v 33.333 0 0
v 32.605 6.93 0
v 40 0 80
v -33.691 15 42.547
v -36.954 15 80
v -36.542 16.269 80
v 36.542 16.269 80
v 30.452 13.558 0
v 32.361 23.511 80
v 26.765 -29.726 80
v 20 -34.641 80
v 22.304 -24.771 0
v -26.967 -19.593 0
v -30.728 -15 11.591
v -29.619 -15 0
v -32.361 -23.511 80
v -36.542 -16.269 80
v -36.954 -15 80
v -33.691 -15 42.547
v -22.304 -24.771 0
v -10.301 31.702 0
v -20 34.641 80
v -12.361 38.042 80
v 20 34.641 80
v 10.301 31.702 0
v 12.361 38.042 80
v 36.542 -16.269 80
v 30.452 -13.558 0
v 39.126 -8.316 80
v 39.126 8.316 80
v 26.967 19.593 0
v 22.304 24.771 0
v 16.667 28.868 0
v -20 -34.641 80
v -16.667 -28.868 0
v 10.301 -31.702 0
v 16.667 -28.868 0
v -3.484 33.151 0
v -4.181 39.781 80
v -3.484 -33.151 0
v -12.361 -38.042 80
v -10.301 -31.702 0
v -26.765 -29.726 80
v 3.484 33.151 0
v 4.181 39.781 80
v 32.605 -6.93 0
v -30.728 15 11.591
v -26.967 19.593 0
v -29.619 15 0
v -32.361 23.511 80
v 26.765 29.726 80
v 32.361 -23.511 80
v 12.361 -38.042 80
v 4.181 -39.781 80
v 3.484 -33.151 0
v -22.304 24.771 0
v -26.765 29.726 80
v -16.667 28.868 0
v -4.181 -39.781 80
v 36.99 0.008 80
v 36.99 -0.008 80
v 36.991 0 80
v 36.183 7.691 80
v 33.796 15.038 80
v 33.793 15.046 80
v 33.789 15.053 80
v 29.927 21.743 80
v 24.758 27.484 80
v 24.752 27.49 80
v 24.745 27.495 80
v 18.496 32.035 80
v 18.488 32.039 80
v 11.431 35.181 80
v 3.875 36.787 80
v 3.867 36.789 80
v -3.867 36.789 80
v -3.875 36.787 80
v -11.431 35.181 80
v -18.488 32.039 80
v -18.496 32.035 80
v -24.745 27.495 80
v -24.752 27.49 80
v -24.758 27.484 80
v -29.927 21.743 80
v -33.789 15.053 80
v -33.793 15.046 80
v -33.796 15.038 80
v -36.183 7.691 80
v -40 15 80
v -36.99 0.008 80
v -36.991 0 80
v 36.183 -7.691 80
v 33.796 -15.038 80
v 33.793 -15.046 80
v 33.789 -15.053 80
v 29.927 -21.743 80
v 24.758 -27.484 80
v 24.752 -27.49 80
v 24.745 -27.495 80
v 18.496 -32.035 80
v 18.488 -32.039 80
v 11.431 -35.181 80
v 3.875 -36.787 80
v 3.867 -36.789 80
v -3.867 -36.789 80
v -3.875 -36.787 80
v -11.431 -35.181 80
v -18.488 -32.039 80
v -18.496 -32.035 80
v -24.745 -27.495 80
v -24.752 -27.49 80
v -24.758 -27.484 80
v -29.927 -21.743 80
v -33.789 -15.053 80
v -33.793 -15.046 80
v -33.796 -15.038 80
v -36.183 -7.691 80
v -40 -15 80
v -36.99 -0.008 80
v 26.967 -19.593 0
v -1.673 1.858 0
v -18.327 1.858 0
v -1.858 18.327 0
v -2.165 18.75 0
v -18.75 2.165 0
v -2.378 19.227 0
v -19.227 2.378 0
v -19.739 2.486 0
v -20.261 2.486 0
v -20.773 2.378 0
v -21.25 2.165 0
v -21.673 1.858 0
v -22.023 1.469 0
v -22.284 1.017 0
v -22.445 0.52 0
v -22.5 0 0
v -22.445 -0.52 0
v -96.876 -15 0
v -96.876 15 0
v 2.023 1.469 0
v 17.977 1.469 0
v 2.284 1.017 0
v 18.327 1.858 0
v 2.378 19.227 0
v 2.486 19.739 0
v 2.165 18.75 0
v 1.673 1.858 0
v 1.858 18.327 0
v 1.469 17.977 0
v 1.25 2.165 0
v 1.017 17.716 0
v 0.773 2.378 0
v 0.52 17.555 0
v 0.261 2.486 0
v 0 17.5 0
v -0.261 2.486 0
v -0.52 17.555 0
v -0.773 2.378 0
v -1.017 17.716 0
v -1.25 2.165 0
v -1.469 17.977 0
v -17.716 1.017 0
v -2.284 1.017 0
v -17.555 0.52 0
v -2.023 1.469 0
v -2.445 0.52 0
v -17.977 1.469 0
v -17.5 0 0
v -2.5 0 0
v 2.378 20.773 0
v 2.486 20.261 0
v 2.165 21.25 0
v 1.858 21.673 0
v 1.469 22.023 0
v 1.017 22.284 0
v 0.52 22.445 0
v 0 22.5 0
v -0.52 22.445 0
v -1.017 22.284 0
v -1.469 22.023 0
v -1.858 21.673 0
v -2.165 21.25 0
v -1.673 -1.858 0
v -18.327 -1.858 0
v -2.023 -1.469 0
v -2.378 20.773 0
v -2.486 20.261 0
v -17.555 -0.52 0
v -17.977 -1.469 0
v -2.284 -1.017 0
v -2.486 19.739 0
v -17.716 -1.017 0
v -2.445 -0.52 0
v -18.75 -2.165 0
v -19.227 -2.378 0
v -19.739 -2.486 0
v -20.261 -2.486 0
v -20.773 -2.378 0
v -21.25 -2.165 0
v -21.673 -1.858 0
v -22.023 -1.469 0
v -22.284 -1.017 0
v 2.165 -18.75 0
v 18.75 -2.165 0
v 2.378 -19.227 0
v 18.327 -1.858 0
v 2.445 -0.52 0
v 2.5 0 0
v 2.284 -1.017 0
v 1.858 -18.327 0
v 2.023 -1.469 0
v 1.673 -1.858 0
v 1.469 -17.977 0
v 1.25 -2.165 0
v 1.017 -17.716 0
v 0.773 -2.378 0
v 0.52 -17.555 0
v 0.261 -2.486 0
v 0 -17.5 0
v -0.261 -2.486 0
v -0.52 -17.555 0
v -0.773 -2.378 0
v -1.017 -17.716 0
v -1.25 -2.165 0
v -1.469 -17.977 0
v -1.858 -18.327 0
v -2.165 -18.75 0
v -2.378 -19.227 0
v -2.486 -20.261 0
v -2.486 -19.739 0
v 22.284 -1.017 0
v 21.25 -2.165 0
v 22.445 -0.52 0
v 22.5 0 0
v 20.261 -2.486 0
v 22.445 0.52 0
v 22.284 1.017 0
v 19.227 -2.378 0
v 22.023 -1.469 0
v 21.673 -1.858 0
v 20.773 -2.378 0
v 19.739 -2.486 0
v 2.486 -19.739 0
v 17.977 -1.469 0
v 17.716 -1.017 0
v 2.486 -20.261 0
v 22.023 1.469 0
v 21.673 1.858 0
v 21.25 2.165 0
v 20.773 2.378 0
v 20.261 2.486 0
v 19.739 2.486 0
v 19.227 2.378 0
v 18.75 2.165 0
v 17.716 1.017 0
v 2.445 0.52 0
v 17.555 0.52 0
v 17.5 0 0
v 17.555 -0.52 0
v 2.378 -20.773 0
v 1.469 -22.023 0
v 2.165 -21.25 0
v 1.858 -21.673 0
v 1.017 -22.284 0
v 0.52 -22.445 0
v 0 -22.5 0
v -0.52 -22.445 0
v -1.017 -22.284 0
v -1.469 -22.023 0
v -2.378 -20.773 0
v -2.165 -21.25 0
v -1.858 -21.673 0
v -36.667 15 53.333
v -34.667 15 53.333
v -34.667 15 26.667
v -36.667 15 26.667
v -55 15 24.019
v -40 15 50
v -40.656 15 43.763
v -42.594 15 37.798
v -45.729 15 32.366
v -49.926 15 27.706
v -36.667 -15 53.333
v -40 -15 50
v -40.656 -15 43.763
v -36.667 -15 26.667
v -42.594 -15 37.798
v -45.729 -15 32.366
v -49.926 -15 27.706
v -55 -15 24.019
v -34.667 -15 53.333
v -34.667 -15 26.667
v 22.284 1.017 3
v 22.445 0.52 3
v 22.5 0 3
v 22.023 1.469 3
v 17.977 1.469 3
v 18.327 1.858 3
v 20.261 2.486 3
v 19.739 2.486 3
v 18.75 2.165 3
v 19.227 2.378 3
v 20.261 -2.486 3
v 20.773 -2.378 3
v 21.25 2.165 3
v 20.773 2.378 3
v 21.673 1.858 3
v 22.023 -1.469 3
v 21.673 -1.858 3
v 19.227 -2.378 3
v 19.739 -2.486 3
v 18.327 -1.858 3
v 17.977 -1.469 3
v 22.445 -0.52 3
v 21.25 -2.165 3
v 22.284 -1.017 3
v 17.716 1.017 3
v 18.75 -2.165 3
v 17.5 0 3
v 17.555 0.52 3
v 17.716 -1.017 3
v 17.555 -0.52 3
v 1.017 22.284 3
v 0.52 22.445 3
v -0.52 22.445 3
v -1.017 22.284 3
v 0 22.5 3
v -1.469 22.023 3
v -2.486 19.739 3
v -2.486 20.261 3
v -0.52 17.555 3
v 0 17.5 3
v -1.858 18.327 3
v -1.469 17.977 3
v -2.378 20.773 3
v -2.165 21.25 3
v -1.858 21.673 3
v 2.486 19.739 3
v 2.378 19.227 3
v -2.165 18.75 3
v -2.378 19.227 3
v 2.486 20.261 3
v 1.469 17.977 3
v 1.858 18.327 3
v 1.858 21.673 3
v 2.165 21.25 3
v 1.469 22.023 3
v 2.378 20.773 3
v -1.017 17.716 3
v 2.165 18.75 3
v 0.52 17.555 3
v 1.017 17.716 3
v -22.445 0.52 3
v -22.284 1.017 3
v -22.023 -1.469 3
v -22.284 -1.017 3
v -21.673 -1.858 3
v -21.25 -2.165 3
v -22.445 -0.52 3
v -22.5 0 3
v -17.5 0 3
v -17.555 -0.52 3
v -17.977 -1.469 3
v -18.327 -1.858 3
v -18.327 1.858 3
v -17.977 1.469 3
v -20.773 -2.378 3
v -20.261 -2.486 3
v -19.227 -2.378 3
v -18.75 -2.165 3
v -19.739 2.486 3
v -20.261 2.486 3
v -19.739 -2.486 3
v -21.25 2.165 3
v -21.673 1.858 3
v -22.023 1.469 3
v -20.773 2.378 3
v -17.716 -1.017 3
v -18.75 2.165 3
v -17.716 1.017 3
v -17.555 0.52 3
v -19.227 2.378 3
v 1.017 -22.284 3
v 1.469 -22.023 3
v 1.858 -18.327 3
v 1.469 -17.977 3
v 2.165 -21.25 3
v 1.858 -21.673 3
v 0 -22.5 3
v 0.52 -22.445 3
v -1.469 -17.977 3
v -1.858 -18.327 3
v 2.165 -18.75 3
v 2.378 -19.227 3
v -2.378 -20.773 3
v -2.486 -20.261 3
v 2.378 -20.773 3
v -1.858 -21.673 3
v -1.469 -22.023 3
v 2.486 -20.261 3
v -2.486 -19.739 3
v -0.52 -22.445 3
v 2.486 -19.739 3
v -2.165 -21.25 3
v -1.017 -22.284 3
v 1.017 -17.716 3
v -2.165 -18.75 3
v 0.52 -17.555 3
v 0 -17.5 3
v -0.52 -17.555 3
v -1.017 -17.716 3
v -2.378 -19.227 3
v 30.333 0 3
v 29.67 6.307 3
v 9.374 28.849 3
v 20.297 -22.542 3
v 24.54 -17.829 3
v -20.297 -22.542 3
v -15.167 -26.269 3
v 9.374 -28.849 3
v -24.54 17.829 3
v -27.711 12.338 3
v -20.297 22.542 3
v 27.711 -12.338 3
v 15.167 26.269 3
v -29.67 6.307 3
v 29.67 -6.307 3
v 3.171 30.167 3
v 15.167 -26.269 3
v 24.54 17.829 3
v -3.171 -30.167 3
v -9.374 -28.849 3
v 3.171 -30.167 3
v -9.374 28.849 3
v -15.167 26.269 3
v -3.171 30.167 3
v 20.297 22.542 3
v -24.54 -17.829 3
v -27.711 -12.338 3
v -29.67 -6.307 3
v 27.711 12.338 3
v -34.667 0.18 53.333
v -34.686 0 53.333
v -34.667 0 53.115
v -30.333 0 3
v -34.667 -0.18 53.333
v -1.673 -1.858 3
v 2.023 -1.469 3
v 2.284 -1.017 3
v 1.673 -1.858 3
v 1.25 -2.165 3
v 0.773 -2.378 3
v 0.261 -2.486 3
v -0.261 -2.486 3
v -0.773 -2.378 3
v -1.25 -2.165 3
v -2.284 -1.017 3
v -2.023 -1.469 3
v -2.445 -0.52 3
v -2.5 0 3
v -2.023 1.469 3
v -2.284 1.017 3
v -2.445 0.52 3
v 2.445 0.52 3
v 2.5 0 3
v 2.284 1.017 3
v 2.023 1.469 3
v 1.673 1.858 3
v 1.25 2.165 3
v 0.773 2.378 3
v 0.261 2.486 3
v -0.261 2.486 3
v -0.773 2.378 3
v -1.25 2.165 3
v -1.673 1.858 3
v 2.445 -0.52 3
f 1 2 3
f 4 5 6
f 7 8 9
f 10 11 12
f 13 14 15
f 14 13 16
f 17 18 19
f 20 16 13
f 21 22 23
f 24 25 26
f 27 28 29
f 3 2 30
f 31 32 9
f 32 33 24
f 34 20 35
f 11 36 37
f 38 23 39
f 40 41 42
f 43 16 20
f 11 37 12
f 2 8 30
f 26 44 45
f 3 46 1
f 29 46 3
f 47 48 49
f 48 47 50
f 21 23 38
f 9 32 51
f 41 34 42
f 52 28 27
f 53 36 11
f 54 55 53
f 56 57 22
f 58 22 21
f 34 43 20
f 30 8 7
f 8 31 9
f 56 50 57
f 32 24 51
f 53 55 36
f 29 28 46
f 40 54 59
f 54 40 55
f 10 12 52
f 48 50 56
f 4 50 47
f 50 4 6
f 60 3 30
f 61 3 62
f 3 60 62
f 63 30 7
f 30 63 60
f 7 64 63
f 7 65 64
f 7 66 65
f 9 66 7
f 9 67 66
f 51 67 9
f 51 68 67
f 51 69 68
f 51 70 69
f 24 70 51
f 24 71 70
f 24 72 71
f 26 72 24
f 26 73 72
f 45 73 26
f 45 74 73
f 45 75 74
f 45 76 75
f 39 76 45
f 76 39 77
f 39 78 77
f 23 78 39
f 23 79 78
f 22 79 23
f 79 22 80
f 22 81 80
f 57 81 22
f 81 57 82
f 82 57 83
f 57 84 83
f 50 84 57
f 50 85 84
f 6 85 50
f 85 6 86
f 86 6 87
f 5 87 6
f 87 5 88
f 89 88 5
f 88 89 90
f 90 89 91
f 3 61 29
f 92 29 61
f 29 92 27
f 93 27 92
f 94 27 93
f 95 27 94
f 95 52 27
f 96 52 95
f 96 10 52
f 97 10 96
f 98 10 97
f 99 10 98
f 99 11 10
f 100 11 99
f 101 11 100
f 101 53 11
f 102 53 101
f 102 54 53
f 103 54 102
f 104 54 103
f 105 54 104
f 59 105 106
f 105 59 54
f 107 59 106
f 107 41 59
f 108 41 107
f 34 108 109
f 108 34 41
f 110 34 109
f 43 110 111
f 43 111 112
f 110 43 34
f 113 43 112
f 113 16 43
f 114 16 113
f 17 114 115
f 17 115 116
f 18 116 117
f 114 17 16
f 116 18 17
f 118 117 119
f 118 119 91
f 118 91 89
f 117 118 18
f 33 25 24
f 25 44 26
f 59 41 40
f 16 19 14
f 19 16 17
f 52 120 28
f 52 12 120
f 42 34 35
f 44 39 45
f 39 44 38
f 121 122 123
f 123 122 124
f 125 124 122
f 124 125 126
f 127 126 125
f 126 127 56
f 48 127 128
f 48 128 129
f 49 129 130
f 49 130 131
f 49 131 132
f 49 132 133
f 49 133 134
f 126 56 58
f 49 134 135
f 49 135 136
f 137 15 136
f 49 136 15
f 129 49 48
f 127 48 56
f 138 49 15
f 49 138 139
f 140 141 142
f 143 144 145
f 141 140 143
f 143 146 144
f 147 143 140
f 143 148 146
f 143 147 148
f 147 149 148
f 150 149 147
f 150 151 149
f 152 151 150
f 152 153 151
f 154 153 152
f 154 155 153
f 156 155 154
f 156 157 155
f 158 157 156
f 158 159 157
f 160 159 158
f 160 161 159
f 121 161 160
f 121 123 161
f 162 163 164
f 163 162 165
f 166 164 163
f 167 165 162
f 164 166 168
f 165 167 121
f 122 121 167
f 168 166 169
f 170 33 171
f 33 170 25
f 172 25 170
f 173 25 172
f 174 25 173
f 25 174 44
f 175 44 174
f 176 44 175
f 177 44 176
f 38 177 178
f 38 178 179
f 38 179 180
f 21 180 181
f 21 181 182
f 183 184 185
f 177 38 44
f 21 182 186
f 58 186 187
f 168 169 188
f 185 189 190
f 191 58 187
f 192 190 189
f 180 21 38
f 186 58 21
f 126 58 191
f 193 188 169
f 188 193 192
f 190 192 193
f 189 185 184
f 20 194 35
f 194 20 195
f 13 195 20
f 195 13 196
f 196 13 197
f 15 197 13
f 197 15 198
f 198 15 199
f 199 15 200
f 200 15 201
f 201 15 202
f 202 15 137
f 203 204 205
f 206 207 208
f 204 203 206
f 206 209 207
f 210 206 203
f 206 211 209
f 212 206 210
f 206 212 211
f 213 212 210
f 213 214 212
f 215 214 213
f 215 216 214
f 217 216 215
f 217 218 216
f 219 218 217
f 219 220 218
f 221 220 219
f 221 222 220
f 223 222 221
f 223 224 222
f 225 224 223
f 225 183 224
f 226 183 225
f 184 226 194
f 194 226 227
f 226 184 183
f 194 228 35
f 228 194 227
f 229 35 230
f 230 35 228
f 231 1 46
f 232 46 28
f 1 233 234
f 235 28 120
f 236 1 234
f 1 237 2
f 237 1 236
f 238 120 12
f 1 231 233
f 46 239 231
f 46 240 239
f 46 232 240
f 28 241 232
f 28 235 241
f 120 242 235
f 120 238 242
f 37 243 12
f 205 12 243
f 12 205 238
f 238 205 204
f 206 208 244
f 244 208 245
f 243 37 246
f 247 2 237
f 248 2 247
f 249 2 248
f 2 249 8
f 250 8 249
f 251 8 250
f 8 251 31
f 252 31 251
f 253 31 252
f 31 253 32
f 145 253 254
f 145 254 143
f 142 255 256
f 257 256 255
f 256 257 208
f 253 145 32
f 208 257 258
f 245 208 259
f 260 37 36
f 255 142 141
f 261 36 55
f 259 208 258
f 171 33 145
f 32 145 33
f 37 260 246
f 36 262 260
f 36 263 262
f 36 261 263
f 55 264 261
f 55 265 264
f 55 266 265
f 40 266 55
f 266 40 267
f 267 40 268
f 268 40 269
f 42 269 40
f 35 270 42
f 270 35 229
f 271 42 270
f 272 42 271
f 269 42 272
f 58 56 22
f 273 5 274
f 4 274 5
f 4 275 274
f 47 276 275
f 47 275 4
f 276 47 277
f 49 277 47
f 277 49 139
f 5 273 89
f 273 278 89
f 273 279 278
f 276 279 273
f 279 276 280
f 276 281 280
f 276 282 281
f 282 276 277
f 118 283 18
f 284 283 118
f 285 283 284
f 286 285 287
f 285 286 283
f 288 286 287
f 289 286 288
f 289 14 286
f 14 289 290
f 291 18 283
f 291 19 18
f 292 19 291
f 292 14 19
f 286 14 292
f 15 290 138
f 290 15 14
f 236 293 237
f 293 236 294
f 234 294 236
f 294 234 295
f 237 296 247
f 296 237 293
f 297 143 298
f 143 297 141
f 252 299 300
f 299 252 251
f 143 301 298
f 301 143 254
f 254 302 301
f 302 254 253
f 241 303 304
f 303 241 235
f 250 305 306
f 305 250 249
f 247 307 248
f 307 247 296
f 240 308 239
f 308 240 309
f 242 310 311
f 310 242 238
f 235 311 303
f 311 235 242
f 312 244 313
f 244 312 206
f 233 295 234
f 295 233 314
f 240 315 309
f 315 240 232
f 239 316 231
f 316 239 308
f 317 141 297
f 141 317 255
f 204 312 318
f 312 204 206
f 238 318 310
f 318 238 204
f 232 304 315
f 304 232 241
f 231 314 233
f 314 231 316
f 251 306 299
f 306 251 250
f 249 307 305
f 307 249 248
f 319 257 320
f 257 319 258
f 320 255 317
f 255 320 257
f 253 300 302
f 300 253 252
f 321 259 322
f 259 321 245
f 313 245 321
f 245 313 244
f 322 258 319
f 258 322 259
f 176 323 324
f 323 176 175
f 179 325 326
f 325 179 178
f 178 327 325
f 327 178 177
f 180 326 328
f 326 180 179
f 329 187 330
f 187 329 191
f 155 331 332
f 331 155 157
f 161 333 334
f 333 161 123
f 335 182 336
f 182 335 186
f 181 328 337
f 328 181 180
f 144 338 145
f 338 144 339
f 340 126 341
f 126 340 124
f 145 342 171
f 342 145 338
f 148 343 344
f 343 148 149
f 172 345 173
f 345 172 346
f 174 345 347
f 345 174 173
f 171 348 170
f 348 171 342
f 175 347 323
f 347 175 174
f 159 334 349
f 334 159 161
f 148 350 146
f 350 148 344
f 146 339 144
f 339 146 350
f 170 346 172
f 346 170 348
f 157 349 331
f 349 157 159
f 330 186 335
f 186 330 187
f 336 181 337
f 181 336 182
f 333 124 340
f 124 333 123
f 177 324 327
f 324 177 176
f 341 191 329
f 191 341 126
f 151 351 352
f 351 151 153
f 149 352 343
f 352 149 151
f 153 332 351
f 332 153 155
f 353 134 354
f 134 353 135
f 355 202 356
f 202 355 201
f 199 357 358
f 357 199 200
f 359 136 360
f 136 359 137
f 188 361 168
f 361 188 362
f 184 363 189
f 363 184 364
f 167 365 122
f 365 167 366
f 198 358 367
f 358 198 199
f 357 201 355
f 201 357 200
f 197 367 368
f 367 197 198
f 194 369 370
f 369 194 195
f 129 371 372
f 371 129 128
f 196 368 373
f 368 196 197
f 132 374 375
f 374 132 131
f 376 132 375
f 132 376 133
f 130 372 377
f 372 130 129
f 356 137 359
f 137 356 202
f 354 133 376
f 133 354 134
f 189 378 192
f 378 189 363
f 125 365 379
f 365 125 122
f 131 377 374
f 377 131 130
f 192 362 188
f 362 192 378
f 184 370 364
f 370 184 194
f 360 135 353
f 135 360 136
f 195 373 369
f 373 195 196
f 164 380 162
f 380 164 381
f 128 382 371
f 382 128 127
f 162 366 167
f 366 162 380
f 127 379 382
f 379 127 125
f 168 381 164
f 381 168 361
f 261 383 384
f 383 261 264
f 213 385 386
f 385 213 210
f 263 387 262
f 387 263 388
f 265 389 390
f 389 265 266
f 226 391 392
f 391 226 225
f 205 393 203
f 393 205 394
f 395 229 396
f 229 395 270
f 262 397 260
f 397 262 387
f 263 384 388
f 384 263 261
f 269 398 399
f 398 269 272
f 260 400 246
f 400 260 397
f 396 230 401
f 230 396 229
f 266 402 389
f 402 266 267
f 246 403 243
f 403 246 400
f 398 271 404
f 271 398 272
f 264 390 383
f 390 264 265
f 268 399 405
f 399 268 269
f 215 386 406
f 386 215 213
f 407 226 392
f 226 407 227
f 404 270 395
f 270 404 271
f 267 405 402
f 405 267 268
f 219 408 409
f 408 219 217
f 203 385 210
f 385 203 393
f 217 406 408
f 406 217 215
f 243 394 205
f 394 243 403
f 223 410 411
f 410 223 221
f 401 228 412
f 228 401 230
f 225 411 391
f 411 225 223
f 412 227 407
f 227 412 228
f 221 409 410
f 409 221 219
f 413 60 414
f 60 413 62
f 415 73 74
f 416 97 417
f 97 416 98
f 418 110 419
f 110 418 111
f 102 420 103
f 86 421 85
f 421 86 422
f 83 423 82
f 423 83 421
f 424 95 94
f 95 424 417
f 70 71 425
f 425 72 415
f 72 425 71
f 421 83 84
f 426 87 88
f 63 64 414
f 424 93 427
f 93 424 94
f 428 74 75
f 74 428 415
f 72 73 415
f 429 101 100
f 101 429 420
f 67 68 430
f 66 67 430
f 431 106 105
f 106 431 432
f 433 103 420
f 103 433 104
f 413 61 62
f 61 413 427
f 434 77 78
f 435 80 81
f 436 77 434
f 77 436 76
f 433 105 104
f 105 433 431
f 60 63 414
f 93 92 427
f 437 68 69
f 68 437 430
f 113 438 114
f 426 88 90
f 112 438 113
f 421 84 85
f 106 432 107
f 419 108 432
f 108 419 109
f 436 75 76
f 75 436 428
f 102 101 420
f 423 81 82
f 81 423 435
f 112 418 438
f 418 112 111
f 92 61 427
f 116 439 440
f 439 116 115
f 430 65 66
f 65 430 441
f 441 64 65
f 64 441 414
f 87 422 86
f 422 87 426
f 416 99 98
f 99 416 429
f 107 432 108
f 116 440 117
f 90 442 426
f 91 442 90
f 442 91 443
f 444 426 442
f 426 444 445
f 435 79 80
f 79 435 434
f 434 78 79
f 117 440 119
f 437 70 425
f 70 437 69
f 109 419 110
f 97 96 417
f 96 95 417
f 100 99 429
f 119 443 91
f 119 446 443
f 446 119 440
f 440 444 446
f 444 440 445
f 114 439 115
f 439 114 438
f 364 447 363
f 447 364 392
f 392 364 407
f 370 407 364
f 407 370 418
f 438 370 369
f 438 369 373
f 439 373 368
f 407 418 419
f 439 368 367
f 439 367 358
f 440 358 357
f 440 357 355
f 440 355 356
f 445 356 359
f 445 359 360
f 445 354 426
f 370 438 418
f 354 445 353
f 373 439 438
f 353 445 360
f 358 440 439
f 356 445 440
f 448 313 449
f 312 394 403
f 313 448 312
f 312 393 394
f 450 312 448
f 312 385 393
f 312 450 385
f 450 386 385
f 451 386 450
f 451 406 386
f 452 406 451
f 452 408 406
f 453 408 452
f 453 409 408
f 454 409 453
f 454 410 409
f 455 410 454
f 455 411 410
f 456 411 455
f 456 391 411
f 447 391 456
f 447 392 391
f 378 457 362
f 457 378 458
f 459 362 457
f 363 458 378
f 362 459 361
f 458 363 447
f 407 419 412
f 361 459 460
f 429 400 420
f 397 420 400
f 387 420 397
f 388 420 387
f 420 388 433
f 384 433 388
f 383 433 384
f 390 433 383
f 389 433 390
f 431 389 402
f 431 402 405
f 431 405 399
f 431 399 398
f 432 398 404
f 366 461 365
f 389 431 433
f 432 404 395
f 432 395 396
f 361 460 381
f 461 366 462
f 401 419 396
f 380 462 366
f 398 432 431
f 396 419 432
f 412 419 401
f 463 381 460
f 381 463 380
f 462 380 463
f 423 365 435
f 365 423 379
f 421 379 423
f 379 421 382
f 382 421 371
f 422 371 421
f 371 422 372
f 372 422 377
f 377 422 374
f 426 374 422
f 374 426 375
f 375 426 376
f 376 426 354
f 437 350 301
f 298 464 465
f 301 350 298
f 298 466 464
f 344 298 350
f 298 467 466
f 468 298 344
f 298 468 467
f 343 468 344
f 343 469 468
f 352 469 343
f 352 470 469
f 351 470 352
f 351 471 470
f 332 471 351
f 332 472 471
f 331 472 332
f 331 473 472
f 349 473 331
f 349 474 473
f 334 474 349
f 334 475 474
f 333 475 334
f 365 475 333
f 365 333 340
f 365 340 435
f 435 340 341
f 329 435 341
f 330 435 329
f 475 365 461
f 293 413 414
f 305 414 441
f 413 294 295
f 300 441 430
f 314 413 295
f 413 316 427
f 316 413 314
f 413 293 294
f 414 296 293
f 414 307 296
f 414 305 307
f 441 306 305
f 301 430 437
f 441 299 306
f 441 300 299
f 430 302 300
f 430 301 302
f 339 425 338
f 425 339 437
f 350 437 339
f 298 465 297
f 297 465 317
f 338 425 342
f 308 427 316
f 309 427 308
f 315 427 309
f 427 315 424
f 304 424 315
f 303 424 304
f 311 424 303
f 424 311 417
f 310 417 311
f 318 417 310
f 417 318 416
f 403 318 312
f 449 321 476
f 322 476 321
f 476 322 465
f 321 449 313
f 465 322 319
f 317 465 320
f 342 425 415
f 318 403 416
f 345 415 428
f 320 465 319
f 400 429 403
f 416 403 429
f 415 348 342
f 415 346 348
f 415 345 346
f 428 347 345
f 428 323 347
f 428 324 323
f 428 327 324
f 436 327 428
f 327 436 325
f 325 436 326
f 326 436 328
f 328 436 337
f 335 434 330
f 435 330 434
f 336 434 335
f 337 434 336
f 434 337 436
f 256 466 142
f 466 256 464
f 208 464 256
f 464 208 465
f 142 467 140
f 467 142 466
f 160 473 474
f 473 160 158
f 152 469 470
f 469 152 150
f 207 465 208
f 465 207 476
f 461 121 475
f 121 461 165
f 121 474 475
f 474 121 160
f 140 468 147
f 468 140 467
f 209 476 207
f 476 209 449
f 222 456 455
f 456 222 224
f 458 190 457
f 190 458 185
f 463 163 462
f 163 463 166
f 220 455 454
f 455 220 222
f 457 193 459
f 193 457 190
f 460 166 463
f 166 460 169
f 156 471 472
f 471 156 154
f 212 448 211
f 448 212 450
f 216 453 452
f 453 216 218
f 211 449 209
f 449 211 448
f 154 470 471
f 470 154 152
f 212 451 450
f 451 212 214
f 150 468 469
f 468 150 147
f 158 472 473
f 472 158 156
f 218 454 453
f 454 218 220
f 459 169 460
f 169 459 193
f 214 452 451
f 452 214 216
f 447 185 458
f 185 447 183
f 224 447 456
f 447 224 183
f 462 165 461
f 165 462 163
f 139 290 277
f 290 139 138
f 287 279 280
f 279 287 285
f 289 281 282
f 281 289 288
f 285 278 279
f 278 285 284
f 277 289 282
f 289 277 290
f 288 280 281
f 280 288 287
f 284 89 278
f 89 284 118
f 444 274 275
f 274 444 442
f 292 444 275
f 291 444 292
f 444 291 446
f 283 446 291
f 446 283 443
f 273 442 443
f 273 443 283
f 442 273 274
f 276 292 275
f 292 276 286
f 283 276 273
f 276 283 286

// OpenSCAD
height = 80;
radius = 40;
t = 3;
drain_size = 5;
handle_width = 30;
handle_radius = 30;
handle_slope = 35;
ziptie_thickness = 2;
$fn=30;

difference() {
    union() {
        //Main pot.
        cylinder(h=height, r1=radius * 5 / 6, r2=radius);
        //Handle attachment.
        translate([-radius - height, -handle_width / 2, 0]) {
            cube([height + radius, handle_width, height]);
        }
    }
    //Inside of the pot.
    translate([0, 0, t]) {
        cylinder(h=height - t + 0.1, r1=radius * 5 / 6 - t, r2=radius - t);
    }
    //Drains.
    translate([0, 0, -0.1]) {
        cylinder(h=t + 0.2, r=drain_size / 2);
    }
    for(a = [0:90:270]) {
        rotate([0, 0, a]) {
            translate([radius / 2, 0, -0.1]) {
                cylinder(h=t + 0.2, r=drain_size / 2);
            }
        }
    }
    //Inside shape attaching to the handle, keeping the pot upright.
    translate([-radius - handle_radius, -handle_width / 2 - 0.1, height - handle_radius]) {
        rotate([-90, 0, 0]) {
            hull() {
                cylinder(h=handle_width + 0.2, r=handle_radius);
                translate([0, -height, 0]) {
                    cylinder(h=handle_width + 0.2, r=handle_radius);
                }
                translate([-height, sin(handle_slope) * height, 0]) {
                    cylinder(h=handle_width + 0.2, r=handle_radius);
                }
            }
        }
    }
    //Opening for zipties.
    translate([-radius * 11 / 12, -handle_width / 2 - 0.1, height / 3]) {
        cube([ziptie_thickness, handle_width + 0.2, height / 3]);
    }
}
